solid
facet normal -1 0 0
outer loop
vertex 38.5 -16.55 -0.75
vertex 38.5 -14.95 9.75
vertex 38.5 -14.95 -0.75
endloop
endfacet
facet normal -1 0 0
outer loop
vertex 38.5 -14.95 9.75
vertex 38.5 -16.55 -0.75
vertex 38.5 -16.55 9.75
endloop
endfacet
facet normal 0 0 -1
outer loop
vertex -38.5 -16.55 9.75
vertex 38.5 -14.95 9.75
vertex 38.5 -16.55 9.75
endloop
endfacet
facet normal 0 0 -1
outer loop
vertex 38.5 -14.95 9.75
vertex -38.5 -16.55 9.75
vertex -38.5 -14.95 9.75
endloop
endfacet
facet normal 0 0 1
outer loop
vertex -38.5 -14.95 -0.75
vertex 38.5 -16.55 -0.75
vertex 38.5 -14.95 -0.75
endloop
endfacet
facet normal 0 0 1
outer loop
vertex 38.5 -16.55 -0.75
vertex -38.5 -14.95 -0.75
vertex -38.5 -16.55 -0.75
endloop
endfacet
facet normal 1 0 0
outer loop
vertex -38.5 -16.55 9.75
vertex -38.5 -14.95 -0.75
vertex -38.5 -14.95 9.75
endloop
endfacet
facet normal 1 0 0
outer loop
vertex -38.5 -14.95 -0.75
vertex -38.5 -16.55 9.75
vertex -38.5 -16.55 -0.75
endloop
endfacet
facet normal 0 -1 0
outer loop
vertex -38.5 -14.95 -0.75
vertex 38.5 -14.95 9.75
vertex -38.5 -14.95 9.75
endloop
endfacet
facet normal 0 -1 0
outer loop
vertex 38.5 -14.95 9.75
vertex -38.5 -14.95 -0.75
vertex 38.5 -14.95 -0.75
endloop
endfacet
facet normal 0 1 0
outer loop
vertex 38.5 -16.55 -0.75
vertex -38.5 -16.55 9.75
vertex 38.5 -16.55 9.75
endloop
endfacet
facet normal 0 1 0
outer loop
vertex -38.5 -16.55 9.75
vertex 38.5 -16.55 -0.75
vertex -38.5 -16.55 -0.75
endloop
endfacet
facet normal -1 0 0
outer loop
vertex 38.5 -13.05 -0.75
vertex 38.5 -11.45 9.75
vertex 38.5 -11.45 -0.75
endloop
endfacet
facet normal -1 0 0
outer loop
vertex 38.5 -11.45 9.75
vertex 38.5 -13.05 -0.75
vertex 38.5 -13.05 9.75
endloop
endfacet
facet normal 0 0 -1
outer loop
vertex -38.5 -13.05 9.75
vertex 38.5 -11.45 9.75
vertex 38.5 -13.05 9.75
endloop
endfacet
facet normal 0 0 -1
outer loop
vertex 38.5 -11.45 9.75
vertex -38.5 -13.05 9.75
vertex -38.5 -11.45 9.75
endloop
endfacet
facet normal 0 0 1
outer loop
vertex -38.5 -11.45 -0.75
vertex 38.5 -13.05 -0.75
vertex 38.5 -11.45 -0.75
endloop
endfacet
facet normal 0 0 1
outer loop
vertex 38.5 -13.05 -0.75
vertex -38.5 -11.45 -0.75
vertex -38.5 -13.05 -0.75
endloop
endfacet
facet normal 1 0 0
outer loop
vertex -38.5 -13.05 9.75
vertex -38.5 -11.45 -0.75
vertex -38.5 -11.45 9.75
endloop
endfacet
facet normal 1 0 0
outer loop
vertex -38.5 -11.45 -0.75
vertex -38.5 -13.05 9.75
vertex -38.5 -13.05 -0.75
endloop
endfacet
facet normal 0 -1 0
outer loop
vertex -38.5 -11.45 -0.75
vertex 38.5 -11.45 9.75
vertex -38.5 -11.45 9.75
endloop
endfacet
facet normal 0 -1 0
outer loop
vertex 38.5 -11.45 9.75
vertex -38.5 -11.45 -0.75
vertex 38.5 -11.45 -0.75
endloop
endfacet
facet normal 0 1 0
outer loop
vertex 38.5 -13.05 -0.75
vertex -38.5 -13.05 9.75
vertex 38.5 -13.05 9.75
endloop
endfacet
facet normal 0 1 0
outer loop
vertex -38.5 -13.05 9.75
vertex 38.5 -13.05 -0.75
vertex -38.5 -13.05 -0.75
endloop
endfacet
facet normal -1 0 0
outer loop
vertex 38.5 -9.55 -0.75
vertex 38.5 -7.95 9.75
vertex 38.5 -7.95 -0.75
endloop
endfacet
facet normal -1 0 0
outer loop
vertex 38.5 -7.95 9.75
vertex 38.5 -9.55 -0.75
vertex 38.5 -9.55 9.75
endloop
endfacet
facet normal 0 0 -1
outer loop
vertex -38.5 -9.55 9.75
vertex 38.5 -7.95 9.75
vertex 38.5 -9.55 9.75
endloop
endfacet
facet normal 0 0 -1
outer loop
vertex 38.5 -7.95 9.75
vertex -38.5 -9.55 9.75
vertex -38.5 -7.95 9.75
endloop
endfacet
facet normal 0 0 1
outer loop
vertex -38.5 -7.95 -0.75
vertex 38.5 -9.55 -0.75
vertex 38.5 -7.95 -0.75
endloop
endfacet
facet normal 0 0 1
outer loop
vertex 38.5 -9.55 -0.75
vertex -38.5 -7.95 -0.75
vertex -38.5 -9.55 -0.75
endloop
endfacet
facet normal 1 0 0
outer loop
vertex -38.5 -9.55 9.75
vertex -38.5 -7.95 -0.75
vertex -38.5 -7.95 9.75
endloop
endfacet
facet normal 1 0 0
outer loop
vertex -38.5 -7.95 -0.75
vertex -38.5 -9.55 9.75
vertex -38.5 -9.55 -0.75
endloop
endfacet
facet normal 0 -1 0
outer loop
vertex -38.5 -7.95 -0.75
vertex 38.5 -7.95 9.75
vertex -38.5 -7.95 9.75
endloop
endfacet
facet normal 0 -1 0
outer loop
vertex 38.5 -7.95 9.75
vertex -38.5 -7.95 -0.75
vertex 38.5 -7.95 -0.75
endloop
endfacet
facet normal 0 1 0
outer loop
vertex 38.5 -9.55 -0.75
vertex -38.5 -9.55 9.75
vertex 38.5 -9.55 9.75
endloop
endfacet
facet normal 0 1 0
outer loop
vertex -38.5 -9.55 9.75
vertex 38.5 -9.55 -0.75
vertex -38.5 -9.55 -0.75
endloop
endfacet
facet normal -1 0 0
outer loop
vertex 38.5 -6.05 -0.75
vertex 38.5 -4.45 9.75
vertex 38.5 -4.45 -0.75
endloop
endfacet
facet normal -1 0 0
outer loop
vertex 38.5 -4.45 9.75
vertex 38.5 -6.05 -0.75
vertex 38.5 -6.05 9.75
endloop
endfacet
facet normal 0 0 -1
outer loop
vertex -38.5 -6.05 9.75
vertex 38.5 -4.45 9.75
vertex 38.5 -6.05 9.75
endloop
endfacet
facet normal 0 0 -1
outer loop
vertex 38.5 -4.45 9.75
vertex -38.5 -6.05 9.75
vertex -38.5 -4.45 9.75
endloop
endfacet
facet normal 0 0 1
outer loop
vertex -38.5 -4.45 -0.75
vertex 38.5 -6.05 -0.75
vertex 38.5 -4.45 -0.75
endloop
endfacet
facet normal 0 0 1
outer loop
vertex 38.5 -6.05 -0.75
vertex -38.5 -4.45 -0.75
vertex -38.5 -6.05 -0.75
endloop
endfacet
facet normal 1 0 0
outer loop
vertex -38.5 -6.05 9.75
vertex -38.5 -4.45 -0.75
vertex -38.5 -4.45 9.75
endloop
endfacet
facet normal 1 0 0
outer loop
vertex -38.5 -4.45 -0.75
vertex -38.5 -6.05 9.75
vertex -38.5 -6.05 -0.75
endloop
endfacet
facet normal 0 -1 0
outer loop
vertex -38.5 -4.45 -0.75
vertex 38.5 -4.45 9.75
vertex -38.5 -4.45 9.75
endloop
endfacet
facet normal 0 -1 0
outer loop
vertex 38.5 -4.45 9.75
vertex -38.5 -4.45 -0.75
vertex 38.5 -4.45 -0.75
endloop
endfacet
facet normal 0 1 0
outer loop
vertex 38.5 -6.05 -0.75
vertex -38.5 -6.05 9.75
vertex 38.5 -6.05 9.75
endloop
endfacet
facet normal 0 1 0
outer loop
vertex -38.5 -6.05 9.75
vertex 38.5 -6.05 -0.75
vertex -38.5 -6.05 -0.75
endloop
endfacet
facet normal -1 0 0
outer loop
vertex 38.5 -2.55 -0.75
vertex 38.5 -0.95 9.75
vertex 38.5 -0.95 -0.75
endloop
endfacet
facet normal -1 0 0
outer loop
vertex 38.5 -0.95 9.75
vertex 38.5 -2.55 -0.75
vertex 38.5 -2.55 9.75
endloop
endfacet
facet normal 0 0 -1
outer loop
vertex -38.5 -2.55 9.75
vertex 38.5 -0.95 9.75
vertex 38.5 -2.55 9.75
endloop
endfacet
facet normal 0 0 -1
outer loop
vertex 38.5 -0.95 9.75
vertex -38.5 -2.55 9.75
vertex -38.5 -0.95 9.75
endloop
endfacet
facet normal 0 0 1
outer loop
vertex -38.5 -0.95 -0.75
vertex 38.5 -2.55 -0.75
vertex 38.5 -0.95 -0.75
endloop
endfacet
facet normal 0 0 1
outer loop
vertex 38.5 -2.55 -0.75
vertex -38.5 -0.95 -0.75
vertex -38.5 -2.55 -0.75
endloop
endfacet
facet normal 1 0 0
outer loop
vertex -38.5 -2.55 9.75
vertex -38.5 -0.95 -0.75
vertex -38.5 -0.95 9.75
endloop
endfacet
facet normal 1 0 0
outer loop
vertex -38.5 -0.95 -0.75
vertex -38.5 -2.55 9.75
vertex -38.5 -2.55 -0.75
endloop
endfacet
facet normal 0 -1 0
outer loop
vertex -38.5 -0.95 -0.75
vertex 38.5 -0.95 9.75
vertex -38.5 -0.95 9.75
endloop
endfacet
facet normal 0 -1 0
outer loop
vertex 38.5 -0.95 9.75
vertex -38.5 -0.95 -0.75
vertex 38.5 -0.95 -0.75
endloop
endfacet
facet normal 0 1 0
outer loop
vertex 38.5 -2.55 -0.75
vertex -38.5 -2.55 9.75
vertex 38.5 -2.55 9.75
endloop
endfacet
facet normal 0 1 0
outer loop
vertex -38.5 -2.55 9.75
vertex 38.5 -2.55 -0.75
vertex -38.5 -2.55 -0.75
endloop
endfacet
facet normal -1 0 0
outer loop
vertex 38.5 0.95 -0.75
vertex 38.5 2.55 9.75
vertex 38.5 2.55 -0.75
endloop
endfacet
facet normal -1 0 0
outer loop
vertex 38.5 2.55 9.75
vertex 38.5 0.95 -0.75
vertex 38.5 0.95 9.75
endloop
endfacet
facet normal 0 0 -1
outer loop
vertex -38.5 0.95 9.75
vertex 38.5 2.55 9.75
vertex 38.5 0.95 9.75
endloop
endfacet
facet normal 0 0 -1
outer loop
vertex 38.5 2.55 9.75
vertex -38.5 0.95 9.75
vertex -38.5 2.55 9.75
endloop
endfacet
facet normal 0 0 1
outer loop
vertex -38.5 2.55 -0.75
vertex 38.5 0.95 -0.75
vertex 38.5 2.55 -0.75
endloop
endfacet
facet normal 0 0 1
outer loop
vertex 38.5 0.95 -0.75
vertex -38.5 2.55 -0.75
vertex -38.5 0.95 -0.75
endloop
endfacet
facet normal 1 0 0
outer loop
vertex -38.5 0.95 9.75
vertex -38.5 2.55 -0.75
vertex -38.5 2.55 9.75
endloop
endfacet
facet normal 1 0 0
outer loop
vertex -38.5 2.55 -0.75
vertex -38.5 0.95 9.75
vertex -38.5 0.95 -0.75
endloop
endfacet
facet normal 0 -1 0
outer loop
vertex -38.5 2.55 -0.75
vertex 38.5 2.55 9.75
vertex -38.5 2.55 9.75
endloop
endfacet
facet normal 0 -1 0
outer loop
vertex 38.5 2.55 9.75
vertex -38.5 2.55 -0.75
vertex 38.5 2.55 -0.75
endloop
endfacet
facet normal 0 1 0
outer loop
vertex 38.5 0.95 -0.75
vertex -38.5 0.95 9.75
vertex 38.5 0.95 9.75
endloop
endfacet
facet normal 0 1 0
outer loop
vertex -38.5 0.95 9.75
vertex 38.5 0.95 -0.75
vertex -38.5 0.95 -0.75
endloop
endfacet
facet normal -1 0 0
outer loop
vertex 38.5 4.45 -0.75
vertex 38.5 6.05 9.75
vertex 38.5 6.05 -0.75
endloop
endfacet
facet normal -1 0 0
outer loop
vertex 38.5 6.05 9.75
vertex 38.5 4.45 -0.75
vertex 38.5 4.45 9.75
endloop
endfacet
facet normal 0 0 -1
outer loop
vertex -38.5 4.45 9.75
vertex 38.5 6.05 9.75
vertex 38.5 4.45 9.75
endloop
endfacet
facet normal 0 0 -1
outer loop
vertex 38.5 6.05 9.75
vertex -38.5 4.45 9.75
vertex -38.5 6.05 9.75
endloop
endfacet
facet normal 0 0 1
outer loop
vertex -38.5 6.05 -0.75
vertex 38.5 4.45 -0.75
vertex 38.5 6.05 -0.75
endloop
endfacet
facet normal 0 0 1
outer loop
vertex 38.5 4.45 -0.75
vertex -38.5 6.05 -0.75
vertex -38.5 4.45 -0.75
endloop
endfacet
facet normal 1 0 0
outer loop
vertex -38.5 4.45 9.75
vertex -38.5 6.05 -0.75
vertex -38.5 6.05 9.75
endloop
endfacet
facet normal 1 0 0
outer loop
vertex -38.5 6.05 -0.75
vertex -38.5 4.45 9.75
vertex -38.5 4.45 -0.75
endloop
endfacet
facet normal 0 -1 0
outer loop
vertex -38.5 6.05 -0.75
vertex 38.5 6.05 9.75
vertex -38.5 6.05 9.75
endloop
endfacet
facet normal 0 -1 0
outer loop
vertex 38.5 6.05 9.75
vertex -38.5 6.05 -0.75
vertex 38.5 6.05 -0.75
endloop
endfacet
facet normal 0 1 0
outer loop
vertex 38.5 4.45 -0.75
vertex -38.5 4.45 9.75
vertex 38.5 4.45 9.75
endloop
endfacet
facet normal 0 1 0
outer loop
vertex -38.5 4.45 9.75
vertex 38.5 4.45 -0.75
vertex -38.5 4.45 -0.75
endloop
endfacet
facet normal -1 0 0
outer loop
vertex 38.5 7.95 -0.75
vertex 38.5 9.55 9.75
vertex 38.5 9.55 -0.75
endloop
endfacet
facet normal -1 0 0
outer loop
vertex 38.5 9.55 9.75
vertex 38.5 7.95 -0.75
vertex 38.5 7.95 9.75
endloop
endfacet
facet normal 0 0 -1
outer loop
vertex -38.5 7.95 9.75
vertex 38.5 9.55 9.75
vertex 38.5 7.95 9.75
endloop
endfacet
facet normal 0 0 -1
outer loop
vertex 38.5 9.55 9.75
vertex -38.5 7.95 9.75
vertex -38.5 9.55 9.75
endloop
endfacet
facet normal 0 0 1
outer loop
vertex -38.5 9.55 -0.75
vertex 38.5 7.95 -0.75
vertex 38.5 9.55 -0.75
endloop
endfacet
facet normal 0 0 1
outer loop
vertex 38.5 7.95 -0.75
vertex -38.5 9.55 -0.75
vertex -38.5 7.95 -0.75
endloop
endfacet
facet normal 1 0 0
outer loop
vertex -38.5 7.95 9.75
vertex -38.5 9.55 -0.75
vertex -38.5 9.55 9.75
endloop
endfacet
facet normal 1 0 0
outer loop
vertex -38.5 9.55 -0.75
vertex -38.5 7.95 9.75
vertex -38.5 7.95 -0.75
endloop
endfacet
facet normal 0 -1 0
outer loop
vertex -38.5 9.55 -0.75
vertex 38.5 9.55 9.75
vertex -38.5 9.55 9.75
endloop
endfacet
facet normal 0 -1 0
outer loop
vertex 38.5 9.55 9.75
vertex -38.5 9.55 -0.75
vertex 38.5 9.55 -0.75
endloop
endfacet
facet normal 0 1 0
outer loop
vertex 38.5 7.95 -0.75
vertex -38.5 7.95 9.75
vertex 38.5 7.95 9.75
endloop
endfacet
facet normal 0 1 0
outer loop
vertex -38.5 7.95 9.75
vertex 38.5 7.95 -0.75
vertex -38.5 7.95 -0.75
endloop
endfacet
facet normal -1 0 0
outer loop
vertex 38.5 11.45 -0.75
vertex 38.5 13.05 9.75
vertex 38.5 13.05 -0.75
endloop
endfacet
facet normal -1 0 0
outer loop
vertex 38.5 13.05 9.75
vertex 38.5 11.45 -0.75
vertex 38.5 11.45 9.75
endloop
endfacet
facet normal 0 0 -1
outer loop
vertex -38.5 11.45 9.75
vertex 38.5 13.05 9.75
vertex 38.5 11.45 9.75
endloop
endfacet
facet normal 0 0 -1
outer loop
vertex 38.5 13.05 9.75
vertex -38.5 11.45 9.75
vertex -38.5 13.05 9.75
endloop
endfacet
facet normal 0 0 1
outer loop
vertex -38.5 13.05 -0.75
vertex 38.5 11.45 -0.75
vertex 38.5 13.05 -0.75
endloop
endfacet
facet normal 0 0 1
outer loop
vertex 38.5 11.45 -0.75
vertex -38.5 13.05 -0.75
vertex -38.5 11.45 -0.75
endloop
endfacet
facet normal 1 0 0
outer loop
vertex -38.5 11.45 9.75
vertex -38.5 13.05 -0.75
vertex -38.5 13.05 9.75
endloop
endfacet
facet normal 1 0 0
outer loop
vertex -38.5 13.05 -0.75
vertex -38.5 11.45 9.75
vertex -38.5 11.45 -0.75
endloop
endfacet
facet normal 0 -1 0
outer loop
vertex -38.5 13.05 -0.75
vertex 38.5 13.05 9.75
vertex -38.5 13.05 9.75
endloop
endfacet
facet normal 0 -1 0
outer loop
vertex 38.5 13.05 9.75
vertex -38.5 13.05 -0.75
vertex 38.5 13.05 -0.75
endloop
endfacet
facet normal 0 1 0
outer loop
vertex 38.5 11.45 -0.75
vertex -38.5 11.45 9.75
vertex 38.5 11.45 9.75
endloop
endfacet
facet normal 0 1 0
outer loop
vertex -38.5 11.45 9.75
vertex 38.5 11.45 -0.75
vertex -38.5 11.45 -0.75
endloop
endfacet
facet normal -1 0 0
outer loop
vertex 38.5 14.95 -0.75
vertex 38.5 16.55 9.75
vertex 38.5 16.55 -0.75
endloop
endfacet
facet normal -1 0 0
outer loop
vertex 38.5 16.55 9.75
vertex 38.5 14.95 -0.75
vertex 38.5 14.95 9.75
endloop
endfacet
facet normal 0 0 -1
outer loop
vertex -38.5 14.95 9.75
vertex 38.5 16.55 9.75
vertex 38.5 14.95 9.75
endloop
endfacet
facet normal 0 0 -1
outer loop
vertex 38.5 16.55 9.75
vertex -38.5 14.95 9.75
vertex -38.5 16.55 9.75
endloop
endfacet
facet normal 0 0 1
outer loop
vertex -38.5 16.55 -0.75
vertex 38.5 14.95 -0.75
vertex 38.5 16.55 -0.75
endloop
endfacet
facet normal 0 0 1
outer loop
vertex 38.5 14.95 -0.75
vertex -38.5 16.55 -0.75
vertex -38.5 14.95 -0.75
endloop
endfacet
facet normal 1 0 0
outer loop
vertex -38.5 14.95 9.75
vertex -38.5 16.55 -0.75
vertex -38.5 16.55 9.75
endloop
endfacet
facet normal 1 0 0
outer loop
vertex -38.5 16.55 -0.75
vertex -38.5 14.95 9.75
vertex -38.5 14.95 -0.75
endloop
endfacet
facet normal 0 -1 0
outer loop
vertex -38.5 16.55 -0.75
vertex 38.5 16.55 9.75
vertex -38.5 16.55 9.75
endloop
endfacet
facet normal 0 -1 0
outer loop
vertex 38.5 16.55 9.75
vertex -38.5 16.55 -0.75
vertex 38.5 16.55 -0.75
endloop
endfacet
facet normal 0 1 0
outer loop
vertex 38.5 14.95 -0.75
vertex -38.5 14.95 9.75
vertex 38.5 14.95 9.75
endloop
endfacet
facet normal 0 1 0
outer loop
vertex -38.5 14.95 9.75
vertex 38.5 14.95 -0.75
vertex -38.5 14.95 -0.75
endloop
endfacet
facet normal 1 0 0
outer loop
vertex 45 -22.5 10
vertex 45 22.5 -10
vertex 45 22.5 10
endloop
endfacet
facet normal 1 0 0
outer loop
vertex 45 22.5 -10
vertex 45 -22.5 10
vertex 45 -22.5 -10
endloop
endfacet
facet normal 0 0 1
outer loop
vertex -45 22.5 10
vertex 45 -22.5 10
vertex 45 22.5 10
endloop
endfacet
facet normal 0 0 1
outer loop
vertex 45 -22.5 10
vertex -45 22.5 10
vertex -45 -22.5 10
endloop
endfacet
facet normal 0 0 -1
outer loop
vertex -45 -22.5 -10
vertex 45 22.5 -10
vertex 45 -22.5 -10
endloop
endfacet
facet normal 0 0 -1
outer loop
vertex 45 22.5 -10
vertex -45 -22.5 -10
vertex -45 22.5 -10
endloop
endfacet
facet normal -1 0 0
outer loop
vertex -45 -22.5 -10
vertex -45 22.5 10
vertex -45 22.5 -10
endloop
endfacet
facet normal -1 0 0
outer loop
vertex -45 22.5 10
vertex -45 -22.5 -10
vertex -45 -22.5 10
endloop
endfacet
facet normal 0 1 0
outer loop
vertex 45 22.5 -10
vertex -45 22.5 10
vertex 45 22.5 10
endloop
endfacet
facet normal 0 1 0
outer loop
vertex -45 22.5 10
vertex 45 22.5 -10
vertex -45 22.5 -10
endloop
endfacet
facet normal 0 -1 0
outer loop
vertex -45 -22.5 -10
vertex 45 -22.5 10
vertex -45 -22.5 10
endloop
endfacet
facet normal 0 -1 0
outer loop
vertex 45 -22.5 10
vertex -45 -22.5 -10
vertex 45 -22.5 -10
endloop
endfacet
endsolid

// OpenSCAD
// Drying rack for 10 microscope slides
// Units: millimetres

// --- Base Block Dimensions ---
base_length = 90;      // X dimension
base_width = 45;        // Y dimension
base_height = 20;      // Z dimension

// --- Slide Specifications ---
slide_length = 75;     // Length of slide (X direction in rack)
slide_width = 25;      // Width of slide (Y direction in rack)
slide_thickness = 1;  // Thickness of slide (Z direction in rack)

// --- Slot Specifications ---
slot_length = 77;      // Length of slot along X
slot_width = 1.6;      // Width of slot along Y
slot_depth = 10;     // Depth of slot along Z (from top)

// --- Slot Layout ---
num_slots = 10;      // Number of slots
slot_spacing = 3.5;    // Centre-to-centre spacing in Y
slot_clearance = 0.5; // Extra depth to ensure non-coplanar cuts (Rule 5)

// --- Calculated Positions ---
// Center the slot group on the base block
slot_group_center_y = 0;
slot_group_center_x = 0;

// Calculate start position for the first slot to center the group
// Total width of slots = (num_slots - 1) * spacing
// We want the center of the group to be at 0.
// The first slot center is at: - ( (num_slots - 1) / 2 ) * spacing
first_slot_y = - ( (num_slots - 1) / 2 ) * slot_spacing;

// --- Construction ---

module drying_rack() {
    // 1. Create the solid base block
    // Centered at origin (0,0,0)
    difference() {
        // Base block
        cube([base_length, base_width, base_height], center = true);
        
        // 2. Cut the slots
        // Slots run along X, so we extrude a rectangle along X and cut it out
        // We use a loop to create each slot
        for (i = [0 : num_slots - 1]) {
            // Calculate Y position for this slot
            current_y = first_slot_y + i * slot_spacing;
            
            // Create a cutting box for the slot
            // Dimensions: X = slot_length, Y = slot_width, Z = slot_depth + clearance
            // Clearance ensures the cut goes slightly past the bottom of the slot
            // to avoid coplanar faces (Rule 5).
            slot_cut_height = slot_depth + slot_clearance; 
            
            // Position the cut:
            // X: Centered on base (0)
            // Y: Calculated position
            // Z: We want to cut from the top face down.
            // Top face is at Z = base_height/2.
            // We want the bottom of the slot at Z = base_height/2 - slot_depth.
            // The cut box center Z should be at: base_height/2 - slot_depth/2 - slot_clearance/2
            // Actually, simpler: Place the cut box such that its top is at base_height/2 + 0.1
            // and its bottom is at base_height/2 - slot_depth - 0.1.
            // Let's center the cut box at Z = base_height/2 - slot_depth/2 - 0.5 (to ensure clearance)
            
            cut_z_center = base_height/2 - slot_depth/2 - 0.5;
            
            translate([0, current_y, cut_z_center]) {
                cube([slot_length, slot_width, slot_cut_height], center = true);
            }
        }
    }
}

drying_rack();
